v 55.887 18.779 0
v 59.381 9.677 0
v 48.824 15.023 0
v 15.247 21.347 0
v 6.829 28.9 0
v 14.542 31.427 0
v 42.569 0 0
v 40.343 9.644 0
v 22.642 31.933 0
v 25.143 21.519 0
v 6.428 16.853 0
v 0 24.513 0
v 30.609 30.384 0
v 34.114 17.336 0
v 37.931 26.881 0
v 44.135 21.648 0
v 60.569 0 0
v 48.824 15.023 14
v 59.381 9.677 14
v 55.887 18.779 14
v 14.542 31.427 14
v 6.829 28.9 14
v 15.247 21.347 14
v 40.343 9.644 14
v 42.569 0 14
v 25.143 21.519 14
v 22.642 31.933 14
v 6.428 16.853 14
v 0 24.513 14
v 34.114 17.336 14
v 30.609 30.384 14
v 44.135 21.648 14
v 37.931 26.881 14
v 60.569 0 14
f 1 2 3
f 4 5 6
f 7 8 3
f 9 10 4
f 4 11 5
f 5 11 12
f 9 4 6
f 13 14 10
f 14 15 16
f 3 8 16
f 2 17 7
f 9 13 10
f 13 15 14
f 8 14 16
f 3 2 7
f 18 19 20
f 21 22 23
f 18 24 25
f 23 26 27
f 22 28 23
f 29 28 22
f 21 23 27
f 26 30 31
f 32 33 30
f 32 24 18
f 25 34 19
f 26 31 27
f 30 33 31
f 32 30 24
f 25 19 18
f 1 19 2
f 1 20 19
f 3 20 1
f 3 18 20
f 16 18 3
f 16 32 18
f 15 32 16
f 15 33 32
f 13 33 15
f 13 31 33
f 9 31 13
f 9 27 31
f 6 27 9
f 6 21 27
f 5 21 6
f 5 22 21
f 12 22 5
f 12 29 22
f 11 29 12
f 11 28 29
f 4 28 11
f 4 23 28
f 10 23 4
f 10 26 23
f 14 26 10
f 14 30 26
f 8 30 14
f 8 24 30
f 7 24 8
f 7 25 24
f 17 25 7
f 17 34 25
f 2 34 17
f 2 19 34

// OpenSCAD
$fn = 32;

// ----------------------------------------------------------------------
// Arc stop: segment, 14 mm thick
// ----------------------------------------------------------------------

// --- parameters (mm) ---
profile_height = 14;      // extrusion height
profile_points = 17;      // points of the closed outline

profile = [[60.569, 0], [59.381, 9.677], [55.887, 18.779], [48.824, 15.023], [44.135, 21.648], [37.931, 26.881], [30.609, 30.384], [22.642, 31.933], [14.542, 31.427], [6.829, 28.9], [0, 24.513], [6.428, 16.853], [15.247, 21.347], [25.143, 21.519], [34.114, 17.336], [40.343, 9.644], [42.569, 0]];  // single closed polygon, 17 points, counter clockwise

// --- the one profile operation ---
linear_extrude(height = profile_height) polygon(points = profile);
